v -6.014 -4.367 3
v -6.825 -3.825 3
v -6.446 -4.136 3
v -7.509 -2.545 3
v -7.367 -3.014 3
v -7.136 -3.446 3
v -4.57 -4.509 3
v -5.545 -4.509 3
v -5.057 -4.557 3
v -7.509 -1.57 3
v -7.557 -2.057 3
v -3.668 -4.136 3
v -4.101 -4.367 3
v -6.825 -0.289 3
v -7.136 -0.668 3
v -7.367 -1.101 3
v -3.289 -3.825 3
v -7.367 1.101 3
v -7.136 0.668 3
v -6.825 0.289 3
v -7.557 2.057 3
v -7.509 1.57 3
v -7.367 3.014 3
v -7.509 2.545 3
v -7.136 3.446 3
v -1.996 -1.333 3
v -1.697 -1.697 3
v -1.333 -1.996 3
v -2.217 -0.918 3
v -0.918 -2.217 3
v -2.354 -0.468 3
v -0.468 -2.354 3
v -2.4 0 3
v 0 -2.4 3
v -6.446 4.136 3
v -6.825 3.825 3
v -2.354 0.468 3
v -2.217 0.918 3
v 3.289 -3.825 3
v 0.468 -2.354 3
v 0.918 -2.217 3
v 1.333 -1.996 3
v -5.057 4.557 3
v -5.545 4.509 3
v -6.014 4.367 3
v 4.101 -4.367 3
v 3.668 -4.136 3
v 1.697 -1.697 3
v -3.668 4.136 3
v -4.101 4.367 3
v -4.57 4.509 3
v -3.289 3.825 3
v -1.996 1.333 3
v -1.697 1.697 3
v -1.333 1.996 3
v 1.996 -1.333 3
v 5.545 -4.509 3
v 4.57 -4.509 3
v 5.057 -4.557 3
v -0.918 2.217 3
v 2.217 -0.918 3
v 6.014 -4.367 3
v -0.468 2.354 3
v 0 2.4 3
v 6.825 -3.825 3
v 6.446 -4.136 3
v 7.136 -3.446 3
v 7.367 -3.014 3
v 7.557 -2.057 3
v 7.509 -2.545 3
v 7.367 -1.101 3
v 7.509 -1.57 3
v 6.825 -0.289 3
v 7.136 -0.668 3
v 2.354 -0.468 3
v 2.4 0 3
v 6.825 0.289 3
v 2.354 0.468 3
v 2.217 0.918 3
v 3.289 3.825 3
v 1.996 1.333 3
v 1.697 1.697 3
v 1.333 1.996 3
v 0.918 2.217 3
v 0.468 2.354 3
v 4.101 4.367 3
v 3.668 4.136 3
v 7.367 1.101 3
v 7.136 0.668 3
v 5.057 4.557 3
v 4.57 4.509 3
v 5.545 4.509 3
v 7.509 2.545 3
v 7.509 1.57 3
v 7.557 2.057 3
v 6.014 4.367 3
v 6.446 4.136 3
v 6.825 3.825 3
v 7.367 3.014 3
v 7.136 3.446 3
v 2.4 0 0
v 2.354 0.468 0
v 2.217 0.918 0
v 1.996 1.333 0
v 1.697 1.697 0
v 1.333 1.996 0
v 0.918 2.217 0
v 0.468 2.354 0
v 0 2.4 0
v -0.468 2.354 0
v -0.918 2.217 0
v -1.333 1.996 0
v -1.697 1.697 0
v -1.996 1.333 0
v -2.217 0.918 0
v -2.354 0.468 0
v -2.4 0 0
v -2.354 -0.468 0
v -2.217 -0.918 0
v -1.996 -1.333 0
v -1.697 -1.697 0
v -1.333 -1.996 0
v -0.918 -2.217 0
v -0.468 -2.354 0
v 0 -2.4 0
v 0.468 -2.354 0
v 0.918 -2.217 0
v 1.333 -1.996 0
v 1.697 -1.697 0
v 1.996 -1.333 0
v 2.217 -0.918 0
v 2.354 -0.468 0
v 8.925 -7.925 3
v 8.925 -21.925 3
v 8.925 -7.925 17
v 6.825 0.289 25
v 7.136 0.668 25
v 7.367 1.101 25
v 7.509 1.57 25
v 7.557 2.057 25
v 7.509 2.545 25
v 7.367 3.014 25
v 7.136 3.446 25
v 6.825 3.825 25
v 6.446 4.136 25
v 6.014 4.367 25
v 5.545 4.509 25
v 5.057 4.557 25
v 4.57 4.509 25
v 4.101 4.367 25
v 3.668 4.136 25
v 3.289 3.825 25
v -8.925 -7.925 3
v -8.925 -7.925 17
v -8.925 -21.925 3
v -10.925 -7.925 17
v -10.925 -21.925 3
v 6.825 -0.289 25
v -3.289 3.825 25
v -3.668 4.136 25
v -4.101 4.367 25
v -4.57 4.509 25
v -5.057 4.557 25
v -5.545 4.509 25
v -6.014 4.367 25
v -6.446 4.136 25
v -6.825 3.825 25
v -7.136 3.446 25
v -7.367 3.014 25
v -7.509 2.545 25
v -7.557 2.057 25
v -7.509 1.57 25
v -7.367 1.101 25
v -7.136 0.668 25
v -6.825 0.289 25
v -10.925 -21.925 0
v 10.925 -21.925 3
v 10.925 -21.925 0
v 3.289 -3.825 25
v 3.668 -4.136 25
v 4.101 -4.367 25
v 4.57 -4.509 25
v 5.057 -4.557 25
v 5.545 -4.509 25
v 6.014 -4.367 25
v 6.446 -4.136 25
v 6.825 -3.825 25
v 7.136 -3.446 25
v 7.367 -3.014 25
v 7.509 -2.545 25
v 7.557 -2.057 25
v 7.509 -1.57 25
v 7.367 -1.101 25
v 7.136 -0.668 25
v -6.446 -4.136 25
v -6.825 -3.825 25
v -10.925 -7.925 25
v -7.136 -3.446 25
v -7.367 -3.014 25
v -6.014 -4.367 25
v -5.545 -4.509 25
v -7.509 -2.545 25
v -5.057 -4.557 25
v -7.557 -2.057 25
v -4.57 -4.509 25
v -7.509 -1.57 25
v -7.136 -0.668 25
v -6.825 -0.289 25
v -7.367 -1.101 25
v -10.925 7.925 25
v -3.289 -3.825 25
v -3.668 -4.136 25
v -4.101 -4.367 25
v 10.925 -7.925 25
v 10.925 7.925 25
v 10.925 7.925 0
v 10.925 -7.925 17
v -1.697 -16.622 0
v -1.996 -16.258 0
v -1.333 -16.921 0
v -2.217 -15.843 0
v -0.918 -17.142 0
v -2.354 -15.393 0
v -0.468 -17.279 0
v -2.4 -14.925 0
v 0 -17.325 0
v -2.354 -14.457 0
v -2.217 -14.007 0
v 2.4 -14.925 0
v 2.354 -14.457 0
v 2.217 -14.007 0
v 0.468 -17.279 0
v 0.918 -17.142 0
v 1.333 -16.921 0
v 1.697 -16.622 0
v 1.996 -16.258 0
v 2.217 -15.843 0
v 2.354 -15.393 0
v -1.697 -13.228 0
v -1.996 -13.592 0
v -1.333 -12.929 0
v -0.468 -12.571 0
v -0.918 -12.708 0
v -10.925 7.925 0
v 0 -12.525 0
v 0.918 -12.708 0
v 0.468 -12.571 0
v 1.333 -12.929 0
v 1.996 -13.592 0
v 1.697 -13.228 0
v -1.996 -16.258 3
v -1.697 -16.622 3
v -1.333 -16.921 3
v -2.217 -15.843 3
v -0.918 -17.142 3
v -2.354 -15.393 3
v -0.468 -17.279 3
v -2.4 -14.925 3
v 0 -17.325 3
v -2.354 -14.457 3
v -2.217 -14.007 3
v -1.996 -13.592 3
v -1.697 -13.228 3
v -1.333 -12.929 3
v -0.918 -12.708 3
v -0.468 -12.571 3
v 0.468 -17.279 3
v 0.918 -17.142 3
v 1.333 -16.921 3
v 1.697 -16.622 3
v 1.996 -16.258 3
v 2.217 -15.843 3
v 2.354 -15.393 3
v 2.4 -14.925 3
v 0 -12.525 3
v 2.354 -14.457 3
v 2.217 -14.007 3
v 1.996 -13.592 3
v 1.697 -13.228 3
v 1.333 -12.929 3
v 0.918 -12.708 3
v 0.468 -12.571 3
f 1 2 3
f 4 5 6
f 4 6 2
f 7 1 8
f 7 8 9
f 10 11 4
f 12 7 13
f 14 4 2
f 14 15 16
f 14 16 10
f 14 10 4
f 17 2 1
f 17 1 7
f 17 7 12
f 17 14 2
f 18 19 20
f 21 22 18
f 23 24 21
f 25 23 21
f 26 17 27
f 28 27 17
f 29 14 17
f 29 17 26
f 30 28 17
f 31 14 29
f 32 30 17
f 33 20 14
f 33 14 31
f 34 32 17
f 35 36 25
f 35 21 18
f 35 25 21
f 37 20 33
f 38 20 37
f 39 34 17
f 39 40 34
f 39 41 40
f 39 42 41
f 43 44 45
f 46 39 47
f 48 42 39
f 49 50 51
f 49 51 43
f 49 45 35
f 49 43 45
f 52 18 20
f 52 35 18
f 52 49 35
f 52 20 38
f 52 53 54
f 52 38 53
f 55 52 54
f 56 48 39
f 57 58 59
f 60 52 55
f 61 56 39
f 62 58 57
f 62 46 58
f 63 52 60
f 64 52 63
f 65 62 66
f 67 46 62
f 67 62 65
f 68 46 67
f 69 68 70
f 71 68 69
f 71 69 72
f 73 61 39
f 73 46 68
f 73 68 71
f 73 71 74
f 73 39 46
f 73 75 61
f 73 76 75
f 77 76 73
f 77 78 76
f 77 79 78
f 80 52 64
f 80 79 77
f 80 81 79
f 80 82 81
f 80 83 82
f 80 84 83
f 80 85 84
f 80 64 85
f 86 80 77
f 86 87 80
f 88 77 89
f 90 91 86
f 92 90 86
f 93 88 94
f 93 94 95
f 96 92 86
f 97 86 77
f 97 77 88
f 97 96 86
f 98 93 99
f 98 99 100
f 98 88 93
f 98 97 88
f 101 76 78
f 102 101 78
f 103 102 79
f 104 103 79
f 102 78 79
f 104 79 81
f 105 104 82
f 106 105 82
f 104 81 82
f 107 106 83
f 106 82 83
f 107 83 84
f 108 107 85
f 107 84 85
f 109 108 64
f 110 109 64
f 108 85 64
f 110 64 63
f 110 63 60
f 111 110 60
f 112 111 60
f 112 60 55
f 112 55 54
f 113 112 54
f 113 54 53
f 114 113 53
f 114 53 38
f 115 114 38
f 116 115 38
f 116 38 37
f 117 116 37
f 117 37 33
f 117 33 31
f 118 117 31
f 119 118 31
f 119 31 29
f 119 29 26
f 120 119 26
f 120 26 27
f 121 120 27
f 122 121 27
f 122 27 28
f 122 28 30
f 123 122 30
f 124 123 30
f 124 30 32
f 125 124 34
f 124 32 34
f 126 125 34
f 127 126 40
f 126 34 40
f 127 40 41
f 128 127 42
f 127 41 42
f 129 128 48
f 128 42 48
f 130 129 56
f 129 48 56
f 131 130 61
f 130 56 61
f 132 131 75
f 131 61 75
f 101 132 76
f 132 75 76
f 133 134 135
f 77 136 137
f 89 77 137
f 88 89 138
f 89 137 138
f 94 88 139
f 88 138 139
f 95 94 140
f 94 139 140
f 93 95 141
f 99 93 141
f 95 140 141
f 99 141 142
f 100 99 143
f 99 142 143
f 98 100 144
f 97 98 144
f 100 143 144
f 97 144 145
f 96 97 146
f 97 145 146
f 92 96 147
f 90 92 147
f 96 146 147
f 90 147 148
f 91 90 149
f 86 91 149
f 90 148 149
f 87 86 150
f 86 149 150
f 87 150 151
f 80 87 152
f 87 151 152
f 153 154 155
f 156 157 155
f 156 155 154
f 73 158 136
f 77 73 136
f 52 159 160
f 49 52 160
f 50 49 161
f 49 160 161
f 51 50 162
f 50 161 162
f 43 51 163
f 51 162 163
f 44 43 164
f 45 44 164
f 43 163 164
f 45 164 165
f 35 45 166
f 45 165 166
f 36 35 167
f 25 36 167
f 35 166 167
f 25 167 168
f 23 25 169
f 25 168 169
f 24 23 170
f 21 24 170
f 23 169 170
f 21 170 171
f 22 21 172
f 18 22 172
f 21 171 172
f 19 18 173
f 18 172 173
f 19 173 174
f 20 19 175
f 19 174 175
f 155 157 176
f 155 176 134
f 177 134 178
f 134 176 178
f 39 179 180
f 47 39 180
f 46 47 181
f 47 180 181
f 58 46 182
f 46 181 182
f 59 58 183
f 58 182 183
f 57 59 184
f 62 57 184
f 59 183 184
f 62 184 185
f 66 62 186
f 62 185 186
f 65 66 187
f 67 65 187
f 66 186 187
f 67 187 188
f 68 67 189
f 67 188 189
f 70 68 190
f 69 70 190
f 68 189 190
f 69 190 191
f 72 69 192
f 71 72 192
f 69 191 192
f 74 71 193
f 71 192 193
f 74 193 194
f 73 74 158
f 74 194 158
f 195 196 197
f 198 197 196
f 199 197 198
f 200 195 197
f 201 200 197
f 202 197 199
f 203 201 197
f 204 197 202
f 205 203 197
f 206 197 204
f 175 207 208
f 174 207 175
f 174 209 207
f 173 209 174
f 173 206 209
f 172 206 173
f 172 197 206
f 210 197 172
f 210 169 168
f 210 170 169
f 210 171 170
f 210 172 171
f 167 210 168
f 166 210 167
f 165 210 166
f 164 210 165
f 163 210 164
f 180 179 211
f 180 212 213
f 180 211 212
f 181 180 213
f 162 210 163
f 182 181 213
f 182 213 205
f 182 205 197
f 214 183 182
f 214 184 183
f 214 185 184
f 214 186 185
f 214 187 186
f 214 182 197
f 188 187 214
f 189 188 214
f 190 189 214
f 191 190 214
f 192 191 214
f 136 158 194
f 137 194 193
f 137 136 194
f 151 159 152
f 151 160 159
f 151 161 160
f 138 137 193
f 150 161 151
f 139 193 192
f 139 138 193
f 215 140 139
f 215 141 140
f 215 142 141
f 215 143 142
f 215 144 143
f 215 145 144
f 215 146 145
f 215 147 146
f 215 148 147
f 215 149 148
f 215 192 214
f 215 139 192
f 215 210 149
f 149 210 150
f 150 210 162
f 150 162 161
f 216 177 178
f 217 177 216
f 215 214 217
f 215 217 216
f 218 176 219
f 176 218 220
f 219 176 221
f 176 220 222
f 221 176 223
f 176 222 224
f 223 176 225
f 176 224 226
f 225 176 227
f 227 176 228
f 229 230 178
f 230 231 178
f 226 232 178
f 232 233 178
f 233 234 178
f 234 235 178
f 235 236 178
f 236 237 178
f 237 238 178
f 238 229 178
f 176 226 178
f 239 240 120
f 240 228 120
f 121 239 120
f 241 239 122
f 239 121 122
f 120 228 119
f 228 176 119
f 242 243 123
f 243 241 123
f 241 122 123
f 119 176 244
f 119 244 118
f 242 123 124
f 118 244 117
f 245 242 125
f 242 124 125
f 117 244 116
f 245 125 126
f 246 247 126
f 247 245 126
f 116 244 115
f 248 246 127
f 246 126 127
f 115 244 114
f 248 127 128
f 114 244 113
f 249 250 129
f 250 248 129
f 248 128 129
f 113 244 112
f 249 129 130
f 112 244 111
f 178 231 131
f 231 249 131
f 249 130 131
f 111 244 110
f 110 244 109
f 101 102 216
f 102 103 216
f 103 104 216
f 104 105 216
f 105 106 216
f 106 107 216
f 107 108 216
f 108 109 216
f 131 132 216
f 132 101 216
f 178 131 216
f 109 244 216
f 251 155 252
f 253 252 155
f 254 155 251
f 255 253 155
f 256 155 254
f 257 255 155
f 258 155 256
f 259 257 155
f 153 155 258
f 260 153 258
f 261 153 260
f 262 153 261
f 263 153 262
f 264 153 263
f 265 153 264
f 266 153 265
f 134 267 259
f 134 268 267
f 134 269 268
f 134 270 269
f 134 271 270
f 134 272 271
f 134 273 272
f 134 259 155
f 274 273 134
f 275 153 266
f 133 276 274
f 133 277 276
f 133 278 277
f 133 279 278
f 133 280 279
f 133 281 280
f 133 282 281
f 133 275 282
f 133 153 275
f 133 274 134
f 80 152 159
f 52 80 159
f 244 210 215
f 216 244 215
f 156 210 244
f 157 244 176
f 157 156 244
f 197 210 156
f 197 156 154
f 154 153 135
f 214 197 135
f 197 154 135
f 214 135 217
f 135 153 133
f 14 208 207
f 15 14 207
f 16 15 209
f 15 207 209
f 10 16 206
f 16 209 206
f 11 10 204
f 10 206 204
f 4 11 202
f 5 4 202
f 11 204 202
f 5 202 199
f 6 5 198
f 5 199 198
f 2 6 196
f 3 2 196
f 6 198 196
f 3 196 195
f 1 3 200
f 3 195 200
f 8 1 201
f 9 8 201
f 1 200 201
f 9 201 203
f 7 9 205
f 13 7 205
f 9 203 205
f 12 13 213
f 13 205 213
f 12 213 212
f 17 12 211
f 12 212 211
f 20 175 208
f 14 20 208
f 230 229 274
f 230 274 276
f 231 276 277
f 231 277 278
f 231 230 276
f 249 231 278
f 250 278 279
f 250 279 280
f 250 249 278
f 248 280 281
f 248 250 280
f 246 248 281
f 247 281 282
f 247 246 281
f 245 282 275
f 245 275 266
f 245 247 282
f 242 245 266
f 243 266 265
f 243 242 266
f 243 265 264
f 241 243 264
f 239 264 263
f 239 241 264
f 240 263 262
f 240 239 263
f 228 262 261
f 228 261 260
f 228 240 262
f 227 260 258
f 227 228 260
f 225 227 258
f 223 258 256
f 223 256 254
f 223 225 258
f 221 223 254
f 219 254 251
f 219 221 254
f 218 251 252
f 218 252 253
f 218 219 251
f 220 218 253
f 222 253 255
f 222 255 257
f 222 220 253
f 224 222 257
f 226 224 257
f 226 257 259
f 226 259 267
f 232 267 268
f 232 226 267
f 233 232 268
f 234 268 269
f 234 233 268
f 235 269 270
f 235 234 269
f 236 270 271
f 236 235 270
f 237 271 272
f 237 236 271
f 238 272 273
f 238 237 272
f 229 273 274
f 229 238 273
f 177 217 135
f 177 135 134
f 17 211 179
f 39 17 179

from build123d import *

# Parameters (mm, degrees)
F0_W      = 21.85
F0_H      = 15.85
F1_DEPTH  = 25
F3_DEPTH  = 22
F4_R      = 2.4
F5_DEPTH  = 3.001
F6_W      = 21.85
F6_H      = 14
F6_R      = 2.4
F7_DEPTH  = 3
F9_DEPTH  = 2
F11_DEPTH = 2


with BuildPart() as f1:
    # F0 (on Top) → F1 (new body)
    with BuildSketch(Plane.XY):
        Rectangle(F0_W, F0_H)
    extrude(amount=F1_DEPTH)

    # F2 (on face) → F3 (cut, through all)
    with BuildSketch(Plane.XY.offset(25)):
        with BuildLine():
            Line((3.2894660941, 3.825), (-3.2894660941, 3.825))
            ThreePointArc((-3.2894660941, 3.825), (-6.825, 3.825), (-6.825, 0.2894660941))
            Line((-6.825, 0.2894660941), (-6.825, -0.2894660941))
            ThreePointArc((-6.825, -0.2894660941), (-6.825, -3.825), (-3.2894660941, -3.825))
            Line((-3.2894660941, -3.825), (3.2894660941, -3.825))
            ThreePointArc((3.2894660941, -3.825), (6.825, -3.825), (6.825, -0.2894660941))
            Line((6.825, -0.2894660941), (6.825, 0.2894660941))
            ThreePointArc((6.825, 0.2894660941), (6.825, 3.825), (3.2894660941, 3.825))
        make_face()
    extrude(amount=-F3_DEPTH, mode=Mode.SUBTRACT)

    # F4 (on face) → F5 (cut, through all)
    with BuildSketch(Plane.XY.offset(3)):
        Circle(F4_R)
    extrude(amount=-F5_DEPTH, mode=Mode.SUBTRACT)

    # F6 (on Top) → F7 (join)
    with BuildSketch(Plane.XY):
        with Locations((0, -14.925)):
            Rectangle(F6_W, F6_H)
        with Locations((0, -14.925)):
            Circle(F6_R, mode=Mode.SUBTRACT)
    extrude(amount=F7_DEPTH)

    # F8 (on face) → F9 (join)
    with BuildSketch(Plane(origin=(-10.925, 0, 0), x_dir=(0, -1, 0), z_dir=(-1, 0, 0))):
        Polygon((21.925, 3), (7.925, 17), (7.925, 3), align=None)
    extrude(amount=-F9_DEPTH)

    # F10 (on face) → F11 (join)
    with BuildSketch(Plane.YZ.offset(10.925)):
        Polygon((-7.925, 3), (-7.925, 17), (-21.925, 3), align=None)
    extrude(amount=-F11_DEPTH)


solid = f1.part
